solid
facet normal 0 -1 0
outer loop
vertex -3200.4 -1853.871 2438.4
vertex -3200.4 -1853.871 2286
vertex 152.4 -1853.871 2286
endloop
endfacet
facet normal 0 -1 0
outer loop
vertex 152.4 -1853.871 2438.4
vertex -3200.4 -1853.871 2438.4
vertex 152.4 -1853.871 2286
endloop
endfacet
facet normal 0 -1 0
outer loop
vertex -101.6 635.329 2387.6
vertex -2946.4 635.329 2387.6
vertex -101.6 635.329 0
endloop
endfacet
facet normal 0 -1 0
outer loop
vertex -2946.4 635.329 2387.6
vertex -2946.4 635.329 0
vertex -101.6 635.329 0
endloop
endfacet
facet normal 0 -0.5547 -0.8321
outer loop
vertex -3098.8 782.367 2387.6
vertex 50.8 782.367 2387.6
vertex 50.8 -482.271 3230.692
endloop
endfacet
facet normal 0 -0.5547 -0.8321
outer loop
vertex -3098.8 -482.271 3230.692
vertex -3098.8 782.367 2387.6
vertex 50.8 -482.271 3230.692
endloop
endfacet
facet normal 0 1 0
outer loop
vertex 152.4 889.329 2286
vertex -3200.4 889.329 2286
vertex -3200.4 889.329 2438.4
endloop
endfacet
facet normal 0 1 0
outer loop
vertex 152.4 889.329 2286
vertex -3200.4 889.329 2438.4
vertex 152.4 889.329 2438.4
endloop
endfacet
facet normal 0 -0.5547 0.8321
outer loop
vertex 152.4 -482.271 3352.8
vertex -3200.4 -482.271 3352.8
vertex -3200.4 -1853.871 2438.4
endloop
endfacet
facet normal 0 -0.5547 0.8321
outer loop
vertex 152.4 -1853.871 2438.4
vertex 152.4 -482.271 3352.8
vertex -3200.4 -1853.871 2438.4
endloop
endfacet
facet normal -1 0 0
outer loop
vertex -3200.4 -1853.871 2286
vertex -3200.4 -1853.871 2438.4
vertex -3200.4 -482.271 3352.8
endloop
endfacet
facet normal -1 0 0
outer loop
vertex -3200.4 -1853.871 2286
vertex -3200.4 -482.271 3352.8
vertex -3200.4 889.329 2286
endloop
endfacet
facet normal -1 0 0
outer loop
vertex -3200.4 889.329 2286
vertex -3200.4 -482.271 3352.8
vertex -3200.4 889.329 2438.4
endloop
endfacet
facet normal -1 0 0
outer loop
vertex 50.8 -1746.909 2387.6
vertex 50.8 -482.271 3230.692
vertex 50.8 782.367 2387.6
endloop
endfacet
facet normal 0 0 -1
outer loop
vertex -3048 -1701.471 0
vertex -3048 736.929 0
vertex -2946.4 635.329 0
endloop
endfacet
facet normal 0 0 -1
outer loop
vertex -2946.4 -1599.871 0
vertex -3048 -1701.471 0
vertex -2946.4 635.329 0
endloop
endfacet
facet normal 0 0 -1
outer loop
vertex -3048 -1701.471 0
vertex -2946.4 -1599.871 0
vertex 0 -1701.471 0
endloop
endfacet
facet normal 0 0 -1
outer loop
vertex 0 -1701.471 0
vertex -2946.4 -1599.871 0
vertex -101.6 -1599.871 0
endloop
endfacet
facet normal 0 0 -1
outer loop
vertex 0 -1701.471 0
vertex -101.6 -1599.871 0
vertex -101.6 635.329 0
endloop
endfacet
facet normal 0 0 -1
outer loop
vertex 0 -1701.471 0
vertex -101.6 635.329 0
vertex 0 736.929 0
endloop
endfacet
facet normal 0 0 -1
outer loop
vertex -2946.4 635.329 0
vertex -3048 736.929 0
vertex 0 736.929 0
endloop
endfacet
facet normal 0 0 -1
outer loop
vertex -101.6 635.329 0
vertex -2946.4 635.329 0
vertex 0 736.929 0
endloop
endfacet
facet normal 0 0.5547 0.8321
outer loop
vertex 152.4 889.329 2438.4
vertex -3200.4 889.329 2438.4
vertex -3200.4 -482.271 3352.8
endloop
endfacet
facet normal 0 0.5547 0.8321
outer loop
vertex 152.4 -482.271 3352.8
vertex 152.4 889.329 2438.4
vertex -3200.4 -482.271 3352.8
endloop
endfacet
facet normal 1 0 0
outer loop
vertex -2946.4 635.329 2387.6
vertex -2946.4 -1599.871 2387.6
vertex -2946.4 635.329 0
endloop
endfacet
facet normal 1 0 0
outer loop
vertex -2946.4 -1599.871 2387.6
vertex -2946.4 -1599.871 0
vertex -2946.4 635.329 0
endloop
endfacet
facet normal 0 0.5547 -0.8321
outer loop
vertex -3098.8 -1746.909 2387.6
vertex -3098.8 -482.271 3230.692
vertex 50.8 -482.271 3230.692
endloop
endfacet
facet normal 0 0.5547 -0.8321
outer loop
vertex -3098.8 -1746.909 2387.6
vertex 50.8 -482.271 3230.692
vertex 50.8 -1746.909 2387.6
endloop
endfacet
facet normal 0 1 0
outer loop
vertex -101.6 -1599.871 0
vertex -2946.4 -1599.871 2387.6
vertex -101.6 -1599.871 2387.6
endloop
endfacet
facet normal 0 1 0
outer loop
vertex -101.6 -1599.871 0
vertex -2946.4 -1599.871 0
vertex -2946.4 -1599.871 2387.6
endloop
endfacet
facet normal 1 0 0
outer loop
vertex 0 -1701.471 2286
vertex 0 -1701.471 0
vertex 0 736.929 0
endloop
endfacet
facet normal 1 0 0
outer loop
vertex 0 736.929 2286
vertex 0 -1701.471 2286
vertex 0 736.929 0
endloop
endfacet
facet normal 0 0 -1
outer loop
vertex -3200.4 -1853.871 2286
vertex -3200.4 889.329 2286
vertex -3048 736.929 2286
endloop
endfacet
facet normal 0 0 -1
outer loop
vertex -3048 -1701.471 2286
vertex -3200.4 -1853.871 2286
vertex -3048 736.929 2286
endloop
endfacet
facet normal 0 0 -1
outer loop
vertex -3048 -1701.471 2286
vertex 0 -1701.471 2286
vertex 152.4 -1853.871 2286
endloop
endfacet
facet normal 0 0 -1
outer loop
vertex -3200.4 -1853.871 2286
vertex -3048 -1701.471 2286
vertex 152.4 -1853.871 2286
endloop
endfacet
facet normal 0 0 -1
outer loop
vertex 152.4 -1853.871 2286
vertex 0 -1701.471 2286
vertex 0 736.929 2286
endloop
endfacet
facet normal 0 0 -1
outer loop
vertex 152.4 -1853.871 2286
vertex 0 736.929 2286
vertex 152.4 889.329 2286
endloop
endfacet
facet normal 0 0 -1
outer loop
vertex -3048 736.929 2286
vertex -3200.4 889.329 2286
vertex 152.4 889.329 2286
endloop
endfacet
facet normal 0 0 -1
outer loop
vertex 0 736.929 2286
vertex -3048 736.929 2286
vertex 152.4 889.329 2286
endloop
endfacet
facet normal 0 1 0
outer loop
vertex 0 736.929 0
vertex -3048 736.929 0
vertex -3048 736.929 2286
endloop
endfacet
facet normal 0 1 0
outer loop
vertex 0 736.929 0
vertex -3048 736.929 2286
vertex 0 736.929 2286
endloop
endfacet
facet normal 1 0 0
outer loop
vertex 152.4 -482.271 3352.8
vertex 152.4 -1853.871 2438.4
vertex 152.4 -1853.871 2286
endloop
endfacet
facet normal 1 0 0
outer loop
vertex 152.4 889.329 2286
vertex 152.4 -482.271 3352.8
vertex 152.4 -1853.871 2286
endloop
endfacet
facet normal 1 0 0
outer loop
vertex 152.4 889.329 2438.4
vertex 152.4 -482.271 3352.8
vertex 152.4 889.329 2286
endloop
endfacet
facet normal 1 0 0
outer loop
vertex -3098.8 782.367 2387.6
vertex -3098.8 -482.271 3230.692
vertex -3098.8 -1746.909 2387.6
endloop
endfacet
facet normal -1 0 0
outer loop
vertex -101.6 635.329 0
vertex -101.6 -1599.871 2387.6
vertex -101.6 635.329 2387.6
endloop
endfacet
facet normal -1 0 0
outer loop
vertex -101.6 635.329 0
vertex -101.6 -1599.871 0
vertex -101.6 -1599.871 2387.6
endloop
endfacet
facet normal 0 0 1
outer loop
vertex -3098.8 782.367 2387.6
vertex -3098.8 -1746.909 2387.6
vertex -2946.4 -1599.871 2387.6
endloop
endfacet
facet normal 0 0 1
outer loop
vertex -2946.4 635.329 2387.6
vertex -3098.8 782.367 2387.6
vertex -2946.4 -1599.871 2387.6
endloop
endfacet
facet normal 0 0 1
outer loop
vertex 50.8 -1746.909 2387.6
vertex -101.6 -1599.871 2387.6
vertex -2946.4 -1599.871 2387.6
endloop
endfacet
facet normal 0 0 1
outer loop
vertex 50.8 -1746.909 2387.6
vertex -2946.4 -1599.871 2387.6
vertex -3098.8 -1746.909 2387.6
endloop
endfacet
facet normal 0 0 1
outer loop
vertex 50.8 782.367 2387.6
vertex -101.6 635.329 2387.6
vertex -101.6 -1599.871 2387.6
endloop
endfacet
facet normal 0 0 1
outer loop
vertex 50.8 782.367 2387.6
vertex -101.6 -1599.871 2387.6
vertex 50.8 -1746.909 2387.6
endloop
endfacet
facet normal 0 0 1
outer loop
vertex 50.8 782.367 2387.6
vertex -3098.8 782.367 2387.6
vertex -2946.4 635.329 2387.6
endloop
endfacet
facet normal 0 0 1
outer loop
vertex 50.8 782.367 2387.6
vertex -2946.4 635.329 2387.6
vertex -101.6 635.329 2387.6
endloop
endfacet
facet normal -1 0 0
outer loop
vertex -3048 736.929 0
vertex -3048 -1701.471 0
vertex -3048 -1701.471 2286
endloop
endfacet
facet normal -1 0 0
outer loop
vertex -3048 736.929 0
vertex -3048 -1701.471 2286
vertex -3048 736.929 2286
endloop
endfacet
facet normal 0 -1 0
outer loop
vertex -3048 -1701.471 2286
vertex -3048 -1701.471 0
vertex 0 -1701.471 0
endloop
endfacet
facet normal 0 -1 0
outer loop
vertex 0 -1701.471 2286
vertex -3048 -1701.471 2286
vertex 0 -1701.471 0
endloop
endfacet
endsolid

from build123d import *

# Parameters (mm, degrees)
F0_W     = 3048
F0_H     = 2438.4
F1_DEPTH = 2286
F2_W     = 3352.8
F2_H     = 2743.2
F3_DEPTH = 152.4
F5_DEPTH = 3352.8
F6_T     = -101.6


with BuildPart() as f1:
    # F0 (on Top) → F1 (new body)
    with BuildSketch(Plane.XY):
        with Locations((-1524, -482.2714296149)):
            Rectangle(F0_W, F0_H)
    extrude(amount=F1_DEPTH)

    # F2 (on face) → F3 (join)
    with BuildSketch(Plane.XY.offset(2286)):
        with Locations((-1524, -482.2714296149)):
            Rectangle(F2_W, F2_H)
    extrude(amount=F3_DEPTH)

    # F4 (on face) → F5 (join, through all)
    with BuildSketch(Plane.YZ.offset(152.4)):
        Polygon((-482.2714296149, 3352.8), (-1853.8714296149, 2438.4), (-482.2714296149, 2438.4), align=None)
        Polygon((889.3285703851, 2438.4), (-482.2714296149, 3352.8), (-482.2714296149, 2438.4), align=None)
    extrude(amount=-F5_DEPTH)

    # F6
    f6_openings = [f1.faces().sort_by_distance(p)[0] for p in [
        (-1524, -482.27143, 0),
    ]]
    offset(amount=F6_T, openings=f6_openings, kind=Kind.INTERSECTION)


solid = f1.part
